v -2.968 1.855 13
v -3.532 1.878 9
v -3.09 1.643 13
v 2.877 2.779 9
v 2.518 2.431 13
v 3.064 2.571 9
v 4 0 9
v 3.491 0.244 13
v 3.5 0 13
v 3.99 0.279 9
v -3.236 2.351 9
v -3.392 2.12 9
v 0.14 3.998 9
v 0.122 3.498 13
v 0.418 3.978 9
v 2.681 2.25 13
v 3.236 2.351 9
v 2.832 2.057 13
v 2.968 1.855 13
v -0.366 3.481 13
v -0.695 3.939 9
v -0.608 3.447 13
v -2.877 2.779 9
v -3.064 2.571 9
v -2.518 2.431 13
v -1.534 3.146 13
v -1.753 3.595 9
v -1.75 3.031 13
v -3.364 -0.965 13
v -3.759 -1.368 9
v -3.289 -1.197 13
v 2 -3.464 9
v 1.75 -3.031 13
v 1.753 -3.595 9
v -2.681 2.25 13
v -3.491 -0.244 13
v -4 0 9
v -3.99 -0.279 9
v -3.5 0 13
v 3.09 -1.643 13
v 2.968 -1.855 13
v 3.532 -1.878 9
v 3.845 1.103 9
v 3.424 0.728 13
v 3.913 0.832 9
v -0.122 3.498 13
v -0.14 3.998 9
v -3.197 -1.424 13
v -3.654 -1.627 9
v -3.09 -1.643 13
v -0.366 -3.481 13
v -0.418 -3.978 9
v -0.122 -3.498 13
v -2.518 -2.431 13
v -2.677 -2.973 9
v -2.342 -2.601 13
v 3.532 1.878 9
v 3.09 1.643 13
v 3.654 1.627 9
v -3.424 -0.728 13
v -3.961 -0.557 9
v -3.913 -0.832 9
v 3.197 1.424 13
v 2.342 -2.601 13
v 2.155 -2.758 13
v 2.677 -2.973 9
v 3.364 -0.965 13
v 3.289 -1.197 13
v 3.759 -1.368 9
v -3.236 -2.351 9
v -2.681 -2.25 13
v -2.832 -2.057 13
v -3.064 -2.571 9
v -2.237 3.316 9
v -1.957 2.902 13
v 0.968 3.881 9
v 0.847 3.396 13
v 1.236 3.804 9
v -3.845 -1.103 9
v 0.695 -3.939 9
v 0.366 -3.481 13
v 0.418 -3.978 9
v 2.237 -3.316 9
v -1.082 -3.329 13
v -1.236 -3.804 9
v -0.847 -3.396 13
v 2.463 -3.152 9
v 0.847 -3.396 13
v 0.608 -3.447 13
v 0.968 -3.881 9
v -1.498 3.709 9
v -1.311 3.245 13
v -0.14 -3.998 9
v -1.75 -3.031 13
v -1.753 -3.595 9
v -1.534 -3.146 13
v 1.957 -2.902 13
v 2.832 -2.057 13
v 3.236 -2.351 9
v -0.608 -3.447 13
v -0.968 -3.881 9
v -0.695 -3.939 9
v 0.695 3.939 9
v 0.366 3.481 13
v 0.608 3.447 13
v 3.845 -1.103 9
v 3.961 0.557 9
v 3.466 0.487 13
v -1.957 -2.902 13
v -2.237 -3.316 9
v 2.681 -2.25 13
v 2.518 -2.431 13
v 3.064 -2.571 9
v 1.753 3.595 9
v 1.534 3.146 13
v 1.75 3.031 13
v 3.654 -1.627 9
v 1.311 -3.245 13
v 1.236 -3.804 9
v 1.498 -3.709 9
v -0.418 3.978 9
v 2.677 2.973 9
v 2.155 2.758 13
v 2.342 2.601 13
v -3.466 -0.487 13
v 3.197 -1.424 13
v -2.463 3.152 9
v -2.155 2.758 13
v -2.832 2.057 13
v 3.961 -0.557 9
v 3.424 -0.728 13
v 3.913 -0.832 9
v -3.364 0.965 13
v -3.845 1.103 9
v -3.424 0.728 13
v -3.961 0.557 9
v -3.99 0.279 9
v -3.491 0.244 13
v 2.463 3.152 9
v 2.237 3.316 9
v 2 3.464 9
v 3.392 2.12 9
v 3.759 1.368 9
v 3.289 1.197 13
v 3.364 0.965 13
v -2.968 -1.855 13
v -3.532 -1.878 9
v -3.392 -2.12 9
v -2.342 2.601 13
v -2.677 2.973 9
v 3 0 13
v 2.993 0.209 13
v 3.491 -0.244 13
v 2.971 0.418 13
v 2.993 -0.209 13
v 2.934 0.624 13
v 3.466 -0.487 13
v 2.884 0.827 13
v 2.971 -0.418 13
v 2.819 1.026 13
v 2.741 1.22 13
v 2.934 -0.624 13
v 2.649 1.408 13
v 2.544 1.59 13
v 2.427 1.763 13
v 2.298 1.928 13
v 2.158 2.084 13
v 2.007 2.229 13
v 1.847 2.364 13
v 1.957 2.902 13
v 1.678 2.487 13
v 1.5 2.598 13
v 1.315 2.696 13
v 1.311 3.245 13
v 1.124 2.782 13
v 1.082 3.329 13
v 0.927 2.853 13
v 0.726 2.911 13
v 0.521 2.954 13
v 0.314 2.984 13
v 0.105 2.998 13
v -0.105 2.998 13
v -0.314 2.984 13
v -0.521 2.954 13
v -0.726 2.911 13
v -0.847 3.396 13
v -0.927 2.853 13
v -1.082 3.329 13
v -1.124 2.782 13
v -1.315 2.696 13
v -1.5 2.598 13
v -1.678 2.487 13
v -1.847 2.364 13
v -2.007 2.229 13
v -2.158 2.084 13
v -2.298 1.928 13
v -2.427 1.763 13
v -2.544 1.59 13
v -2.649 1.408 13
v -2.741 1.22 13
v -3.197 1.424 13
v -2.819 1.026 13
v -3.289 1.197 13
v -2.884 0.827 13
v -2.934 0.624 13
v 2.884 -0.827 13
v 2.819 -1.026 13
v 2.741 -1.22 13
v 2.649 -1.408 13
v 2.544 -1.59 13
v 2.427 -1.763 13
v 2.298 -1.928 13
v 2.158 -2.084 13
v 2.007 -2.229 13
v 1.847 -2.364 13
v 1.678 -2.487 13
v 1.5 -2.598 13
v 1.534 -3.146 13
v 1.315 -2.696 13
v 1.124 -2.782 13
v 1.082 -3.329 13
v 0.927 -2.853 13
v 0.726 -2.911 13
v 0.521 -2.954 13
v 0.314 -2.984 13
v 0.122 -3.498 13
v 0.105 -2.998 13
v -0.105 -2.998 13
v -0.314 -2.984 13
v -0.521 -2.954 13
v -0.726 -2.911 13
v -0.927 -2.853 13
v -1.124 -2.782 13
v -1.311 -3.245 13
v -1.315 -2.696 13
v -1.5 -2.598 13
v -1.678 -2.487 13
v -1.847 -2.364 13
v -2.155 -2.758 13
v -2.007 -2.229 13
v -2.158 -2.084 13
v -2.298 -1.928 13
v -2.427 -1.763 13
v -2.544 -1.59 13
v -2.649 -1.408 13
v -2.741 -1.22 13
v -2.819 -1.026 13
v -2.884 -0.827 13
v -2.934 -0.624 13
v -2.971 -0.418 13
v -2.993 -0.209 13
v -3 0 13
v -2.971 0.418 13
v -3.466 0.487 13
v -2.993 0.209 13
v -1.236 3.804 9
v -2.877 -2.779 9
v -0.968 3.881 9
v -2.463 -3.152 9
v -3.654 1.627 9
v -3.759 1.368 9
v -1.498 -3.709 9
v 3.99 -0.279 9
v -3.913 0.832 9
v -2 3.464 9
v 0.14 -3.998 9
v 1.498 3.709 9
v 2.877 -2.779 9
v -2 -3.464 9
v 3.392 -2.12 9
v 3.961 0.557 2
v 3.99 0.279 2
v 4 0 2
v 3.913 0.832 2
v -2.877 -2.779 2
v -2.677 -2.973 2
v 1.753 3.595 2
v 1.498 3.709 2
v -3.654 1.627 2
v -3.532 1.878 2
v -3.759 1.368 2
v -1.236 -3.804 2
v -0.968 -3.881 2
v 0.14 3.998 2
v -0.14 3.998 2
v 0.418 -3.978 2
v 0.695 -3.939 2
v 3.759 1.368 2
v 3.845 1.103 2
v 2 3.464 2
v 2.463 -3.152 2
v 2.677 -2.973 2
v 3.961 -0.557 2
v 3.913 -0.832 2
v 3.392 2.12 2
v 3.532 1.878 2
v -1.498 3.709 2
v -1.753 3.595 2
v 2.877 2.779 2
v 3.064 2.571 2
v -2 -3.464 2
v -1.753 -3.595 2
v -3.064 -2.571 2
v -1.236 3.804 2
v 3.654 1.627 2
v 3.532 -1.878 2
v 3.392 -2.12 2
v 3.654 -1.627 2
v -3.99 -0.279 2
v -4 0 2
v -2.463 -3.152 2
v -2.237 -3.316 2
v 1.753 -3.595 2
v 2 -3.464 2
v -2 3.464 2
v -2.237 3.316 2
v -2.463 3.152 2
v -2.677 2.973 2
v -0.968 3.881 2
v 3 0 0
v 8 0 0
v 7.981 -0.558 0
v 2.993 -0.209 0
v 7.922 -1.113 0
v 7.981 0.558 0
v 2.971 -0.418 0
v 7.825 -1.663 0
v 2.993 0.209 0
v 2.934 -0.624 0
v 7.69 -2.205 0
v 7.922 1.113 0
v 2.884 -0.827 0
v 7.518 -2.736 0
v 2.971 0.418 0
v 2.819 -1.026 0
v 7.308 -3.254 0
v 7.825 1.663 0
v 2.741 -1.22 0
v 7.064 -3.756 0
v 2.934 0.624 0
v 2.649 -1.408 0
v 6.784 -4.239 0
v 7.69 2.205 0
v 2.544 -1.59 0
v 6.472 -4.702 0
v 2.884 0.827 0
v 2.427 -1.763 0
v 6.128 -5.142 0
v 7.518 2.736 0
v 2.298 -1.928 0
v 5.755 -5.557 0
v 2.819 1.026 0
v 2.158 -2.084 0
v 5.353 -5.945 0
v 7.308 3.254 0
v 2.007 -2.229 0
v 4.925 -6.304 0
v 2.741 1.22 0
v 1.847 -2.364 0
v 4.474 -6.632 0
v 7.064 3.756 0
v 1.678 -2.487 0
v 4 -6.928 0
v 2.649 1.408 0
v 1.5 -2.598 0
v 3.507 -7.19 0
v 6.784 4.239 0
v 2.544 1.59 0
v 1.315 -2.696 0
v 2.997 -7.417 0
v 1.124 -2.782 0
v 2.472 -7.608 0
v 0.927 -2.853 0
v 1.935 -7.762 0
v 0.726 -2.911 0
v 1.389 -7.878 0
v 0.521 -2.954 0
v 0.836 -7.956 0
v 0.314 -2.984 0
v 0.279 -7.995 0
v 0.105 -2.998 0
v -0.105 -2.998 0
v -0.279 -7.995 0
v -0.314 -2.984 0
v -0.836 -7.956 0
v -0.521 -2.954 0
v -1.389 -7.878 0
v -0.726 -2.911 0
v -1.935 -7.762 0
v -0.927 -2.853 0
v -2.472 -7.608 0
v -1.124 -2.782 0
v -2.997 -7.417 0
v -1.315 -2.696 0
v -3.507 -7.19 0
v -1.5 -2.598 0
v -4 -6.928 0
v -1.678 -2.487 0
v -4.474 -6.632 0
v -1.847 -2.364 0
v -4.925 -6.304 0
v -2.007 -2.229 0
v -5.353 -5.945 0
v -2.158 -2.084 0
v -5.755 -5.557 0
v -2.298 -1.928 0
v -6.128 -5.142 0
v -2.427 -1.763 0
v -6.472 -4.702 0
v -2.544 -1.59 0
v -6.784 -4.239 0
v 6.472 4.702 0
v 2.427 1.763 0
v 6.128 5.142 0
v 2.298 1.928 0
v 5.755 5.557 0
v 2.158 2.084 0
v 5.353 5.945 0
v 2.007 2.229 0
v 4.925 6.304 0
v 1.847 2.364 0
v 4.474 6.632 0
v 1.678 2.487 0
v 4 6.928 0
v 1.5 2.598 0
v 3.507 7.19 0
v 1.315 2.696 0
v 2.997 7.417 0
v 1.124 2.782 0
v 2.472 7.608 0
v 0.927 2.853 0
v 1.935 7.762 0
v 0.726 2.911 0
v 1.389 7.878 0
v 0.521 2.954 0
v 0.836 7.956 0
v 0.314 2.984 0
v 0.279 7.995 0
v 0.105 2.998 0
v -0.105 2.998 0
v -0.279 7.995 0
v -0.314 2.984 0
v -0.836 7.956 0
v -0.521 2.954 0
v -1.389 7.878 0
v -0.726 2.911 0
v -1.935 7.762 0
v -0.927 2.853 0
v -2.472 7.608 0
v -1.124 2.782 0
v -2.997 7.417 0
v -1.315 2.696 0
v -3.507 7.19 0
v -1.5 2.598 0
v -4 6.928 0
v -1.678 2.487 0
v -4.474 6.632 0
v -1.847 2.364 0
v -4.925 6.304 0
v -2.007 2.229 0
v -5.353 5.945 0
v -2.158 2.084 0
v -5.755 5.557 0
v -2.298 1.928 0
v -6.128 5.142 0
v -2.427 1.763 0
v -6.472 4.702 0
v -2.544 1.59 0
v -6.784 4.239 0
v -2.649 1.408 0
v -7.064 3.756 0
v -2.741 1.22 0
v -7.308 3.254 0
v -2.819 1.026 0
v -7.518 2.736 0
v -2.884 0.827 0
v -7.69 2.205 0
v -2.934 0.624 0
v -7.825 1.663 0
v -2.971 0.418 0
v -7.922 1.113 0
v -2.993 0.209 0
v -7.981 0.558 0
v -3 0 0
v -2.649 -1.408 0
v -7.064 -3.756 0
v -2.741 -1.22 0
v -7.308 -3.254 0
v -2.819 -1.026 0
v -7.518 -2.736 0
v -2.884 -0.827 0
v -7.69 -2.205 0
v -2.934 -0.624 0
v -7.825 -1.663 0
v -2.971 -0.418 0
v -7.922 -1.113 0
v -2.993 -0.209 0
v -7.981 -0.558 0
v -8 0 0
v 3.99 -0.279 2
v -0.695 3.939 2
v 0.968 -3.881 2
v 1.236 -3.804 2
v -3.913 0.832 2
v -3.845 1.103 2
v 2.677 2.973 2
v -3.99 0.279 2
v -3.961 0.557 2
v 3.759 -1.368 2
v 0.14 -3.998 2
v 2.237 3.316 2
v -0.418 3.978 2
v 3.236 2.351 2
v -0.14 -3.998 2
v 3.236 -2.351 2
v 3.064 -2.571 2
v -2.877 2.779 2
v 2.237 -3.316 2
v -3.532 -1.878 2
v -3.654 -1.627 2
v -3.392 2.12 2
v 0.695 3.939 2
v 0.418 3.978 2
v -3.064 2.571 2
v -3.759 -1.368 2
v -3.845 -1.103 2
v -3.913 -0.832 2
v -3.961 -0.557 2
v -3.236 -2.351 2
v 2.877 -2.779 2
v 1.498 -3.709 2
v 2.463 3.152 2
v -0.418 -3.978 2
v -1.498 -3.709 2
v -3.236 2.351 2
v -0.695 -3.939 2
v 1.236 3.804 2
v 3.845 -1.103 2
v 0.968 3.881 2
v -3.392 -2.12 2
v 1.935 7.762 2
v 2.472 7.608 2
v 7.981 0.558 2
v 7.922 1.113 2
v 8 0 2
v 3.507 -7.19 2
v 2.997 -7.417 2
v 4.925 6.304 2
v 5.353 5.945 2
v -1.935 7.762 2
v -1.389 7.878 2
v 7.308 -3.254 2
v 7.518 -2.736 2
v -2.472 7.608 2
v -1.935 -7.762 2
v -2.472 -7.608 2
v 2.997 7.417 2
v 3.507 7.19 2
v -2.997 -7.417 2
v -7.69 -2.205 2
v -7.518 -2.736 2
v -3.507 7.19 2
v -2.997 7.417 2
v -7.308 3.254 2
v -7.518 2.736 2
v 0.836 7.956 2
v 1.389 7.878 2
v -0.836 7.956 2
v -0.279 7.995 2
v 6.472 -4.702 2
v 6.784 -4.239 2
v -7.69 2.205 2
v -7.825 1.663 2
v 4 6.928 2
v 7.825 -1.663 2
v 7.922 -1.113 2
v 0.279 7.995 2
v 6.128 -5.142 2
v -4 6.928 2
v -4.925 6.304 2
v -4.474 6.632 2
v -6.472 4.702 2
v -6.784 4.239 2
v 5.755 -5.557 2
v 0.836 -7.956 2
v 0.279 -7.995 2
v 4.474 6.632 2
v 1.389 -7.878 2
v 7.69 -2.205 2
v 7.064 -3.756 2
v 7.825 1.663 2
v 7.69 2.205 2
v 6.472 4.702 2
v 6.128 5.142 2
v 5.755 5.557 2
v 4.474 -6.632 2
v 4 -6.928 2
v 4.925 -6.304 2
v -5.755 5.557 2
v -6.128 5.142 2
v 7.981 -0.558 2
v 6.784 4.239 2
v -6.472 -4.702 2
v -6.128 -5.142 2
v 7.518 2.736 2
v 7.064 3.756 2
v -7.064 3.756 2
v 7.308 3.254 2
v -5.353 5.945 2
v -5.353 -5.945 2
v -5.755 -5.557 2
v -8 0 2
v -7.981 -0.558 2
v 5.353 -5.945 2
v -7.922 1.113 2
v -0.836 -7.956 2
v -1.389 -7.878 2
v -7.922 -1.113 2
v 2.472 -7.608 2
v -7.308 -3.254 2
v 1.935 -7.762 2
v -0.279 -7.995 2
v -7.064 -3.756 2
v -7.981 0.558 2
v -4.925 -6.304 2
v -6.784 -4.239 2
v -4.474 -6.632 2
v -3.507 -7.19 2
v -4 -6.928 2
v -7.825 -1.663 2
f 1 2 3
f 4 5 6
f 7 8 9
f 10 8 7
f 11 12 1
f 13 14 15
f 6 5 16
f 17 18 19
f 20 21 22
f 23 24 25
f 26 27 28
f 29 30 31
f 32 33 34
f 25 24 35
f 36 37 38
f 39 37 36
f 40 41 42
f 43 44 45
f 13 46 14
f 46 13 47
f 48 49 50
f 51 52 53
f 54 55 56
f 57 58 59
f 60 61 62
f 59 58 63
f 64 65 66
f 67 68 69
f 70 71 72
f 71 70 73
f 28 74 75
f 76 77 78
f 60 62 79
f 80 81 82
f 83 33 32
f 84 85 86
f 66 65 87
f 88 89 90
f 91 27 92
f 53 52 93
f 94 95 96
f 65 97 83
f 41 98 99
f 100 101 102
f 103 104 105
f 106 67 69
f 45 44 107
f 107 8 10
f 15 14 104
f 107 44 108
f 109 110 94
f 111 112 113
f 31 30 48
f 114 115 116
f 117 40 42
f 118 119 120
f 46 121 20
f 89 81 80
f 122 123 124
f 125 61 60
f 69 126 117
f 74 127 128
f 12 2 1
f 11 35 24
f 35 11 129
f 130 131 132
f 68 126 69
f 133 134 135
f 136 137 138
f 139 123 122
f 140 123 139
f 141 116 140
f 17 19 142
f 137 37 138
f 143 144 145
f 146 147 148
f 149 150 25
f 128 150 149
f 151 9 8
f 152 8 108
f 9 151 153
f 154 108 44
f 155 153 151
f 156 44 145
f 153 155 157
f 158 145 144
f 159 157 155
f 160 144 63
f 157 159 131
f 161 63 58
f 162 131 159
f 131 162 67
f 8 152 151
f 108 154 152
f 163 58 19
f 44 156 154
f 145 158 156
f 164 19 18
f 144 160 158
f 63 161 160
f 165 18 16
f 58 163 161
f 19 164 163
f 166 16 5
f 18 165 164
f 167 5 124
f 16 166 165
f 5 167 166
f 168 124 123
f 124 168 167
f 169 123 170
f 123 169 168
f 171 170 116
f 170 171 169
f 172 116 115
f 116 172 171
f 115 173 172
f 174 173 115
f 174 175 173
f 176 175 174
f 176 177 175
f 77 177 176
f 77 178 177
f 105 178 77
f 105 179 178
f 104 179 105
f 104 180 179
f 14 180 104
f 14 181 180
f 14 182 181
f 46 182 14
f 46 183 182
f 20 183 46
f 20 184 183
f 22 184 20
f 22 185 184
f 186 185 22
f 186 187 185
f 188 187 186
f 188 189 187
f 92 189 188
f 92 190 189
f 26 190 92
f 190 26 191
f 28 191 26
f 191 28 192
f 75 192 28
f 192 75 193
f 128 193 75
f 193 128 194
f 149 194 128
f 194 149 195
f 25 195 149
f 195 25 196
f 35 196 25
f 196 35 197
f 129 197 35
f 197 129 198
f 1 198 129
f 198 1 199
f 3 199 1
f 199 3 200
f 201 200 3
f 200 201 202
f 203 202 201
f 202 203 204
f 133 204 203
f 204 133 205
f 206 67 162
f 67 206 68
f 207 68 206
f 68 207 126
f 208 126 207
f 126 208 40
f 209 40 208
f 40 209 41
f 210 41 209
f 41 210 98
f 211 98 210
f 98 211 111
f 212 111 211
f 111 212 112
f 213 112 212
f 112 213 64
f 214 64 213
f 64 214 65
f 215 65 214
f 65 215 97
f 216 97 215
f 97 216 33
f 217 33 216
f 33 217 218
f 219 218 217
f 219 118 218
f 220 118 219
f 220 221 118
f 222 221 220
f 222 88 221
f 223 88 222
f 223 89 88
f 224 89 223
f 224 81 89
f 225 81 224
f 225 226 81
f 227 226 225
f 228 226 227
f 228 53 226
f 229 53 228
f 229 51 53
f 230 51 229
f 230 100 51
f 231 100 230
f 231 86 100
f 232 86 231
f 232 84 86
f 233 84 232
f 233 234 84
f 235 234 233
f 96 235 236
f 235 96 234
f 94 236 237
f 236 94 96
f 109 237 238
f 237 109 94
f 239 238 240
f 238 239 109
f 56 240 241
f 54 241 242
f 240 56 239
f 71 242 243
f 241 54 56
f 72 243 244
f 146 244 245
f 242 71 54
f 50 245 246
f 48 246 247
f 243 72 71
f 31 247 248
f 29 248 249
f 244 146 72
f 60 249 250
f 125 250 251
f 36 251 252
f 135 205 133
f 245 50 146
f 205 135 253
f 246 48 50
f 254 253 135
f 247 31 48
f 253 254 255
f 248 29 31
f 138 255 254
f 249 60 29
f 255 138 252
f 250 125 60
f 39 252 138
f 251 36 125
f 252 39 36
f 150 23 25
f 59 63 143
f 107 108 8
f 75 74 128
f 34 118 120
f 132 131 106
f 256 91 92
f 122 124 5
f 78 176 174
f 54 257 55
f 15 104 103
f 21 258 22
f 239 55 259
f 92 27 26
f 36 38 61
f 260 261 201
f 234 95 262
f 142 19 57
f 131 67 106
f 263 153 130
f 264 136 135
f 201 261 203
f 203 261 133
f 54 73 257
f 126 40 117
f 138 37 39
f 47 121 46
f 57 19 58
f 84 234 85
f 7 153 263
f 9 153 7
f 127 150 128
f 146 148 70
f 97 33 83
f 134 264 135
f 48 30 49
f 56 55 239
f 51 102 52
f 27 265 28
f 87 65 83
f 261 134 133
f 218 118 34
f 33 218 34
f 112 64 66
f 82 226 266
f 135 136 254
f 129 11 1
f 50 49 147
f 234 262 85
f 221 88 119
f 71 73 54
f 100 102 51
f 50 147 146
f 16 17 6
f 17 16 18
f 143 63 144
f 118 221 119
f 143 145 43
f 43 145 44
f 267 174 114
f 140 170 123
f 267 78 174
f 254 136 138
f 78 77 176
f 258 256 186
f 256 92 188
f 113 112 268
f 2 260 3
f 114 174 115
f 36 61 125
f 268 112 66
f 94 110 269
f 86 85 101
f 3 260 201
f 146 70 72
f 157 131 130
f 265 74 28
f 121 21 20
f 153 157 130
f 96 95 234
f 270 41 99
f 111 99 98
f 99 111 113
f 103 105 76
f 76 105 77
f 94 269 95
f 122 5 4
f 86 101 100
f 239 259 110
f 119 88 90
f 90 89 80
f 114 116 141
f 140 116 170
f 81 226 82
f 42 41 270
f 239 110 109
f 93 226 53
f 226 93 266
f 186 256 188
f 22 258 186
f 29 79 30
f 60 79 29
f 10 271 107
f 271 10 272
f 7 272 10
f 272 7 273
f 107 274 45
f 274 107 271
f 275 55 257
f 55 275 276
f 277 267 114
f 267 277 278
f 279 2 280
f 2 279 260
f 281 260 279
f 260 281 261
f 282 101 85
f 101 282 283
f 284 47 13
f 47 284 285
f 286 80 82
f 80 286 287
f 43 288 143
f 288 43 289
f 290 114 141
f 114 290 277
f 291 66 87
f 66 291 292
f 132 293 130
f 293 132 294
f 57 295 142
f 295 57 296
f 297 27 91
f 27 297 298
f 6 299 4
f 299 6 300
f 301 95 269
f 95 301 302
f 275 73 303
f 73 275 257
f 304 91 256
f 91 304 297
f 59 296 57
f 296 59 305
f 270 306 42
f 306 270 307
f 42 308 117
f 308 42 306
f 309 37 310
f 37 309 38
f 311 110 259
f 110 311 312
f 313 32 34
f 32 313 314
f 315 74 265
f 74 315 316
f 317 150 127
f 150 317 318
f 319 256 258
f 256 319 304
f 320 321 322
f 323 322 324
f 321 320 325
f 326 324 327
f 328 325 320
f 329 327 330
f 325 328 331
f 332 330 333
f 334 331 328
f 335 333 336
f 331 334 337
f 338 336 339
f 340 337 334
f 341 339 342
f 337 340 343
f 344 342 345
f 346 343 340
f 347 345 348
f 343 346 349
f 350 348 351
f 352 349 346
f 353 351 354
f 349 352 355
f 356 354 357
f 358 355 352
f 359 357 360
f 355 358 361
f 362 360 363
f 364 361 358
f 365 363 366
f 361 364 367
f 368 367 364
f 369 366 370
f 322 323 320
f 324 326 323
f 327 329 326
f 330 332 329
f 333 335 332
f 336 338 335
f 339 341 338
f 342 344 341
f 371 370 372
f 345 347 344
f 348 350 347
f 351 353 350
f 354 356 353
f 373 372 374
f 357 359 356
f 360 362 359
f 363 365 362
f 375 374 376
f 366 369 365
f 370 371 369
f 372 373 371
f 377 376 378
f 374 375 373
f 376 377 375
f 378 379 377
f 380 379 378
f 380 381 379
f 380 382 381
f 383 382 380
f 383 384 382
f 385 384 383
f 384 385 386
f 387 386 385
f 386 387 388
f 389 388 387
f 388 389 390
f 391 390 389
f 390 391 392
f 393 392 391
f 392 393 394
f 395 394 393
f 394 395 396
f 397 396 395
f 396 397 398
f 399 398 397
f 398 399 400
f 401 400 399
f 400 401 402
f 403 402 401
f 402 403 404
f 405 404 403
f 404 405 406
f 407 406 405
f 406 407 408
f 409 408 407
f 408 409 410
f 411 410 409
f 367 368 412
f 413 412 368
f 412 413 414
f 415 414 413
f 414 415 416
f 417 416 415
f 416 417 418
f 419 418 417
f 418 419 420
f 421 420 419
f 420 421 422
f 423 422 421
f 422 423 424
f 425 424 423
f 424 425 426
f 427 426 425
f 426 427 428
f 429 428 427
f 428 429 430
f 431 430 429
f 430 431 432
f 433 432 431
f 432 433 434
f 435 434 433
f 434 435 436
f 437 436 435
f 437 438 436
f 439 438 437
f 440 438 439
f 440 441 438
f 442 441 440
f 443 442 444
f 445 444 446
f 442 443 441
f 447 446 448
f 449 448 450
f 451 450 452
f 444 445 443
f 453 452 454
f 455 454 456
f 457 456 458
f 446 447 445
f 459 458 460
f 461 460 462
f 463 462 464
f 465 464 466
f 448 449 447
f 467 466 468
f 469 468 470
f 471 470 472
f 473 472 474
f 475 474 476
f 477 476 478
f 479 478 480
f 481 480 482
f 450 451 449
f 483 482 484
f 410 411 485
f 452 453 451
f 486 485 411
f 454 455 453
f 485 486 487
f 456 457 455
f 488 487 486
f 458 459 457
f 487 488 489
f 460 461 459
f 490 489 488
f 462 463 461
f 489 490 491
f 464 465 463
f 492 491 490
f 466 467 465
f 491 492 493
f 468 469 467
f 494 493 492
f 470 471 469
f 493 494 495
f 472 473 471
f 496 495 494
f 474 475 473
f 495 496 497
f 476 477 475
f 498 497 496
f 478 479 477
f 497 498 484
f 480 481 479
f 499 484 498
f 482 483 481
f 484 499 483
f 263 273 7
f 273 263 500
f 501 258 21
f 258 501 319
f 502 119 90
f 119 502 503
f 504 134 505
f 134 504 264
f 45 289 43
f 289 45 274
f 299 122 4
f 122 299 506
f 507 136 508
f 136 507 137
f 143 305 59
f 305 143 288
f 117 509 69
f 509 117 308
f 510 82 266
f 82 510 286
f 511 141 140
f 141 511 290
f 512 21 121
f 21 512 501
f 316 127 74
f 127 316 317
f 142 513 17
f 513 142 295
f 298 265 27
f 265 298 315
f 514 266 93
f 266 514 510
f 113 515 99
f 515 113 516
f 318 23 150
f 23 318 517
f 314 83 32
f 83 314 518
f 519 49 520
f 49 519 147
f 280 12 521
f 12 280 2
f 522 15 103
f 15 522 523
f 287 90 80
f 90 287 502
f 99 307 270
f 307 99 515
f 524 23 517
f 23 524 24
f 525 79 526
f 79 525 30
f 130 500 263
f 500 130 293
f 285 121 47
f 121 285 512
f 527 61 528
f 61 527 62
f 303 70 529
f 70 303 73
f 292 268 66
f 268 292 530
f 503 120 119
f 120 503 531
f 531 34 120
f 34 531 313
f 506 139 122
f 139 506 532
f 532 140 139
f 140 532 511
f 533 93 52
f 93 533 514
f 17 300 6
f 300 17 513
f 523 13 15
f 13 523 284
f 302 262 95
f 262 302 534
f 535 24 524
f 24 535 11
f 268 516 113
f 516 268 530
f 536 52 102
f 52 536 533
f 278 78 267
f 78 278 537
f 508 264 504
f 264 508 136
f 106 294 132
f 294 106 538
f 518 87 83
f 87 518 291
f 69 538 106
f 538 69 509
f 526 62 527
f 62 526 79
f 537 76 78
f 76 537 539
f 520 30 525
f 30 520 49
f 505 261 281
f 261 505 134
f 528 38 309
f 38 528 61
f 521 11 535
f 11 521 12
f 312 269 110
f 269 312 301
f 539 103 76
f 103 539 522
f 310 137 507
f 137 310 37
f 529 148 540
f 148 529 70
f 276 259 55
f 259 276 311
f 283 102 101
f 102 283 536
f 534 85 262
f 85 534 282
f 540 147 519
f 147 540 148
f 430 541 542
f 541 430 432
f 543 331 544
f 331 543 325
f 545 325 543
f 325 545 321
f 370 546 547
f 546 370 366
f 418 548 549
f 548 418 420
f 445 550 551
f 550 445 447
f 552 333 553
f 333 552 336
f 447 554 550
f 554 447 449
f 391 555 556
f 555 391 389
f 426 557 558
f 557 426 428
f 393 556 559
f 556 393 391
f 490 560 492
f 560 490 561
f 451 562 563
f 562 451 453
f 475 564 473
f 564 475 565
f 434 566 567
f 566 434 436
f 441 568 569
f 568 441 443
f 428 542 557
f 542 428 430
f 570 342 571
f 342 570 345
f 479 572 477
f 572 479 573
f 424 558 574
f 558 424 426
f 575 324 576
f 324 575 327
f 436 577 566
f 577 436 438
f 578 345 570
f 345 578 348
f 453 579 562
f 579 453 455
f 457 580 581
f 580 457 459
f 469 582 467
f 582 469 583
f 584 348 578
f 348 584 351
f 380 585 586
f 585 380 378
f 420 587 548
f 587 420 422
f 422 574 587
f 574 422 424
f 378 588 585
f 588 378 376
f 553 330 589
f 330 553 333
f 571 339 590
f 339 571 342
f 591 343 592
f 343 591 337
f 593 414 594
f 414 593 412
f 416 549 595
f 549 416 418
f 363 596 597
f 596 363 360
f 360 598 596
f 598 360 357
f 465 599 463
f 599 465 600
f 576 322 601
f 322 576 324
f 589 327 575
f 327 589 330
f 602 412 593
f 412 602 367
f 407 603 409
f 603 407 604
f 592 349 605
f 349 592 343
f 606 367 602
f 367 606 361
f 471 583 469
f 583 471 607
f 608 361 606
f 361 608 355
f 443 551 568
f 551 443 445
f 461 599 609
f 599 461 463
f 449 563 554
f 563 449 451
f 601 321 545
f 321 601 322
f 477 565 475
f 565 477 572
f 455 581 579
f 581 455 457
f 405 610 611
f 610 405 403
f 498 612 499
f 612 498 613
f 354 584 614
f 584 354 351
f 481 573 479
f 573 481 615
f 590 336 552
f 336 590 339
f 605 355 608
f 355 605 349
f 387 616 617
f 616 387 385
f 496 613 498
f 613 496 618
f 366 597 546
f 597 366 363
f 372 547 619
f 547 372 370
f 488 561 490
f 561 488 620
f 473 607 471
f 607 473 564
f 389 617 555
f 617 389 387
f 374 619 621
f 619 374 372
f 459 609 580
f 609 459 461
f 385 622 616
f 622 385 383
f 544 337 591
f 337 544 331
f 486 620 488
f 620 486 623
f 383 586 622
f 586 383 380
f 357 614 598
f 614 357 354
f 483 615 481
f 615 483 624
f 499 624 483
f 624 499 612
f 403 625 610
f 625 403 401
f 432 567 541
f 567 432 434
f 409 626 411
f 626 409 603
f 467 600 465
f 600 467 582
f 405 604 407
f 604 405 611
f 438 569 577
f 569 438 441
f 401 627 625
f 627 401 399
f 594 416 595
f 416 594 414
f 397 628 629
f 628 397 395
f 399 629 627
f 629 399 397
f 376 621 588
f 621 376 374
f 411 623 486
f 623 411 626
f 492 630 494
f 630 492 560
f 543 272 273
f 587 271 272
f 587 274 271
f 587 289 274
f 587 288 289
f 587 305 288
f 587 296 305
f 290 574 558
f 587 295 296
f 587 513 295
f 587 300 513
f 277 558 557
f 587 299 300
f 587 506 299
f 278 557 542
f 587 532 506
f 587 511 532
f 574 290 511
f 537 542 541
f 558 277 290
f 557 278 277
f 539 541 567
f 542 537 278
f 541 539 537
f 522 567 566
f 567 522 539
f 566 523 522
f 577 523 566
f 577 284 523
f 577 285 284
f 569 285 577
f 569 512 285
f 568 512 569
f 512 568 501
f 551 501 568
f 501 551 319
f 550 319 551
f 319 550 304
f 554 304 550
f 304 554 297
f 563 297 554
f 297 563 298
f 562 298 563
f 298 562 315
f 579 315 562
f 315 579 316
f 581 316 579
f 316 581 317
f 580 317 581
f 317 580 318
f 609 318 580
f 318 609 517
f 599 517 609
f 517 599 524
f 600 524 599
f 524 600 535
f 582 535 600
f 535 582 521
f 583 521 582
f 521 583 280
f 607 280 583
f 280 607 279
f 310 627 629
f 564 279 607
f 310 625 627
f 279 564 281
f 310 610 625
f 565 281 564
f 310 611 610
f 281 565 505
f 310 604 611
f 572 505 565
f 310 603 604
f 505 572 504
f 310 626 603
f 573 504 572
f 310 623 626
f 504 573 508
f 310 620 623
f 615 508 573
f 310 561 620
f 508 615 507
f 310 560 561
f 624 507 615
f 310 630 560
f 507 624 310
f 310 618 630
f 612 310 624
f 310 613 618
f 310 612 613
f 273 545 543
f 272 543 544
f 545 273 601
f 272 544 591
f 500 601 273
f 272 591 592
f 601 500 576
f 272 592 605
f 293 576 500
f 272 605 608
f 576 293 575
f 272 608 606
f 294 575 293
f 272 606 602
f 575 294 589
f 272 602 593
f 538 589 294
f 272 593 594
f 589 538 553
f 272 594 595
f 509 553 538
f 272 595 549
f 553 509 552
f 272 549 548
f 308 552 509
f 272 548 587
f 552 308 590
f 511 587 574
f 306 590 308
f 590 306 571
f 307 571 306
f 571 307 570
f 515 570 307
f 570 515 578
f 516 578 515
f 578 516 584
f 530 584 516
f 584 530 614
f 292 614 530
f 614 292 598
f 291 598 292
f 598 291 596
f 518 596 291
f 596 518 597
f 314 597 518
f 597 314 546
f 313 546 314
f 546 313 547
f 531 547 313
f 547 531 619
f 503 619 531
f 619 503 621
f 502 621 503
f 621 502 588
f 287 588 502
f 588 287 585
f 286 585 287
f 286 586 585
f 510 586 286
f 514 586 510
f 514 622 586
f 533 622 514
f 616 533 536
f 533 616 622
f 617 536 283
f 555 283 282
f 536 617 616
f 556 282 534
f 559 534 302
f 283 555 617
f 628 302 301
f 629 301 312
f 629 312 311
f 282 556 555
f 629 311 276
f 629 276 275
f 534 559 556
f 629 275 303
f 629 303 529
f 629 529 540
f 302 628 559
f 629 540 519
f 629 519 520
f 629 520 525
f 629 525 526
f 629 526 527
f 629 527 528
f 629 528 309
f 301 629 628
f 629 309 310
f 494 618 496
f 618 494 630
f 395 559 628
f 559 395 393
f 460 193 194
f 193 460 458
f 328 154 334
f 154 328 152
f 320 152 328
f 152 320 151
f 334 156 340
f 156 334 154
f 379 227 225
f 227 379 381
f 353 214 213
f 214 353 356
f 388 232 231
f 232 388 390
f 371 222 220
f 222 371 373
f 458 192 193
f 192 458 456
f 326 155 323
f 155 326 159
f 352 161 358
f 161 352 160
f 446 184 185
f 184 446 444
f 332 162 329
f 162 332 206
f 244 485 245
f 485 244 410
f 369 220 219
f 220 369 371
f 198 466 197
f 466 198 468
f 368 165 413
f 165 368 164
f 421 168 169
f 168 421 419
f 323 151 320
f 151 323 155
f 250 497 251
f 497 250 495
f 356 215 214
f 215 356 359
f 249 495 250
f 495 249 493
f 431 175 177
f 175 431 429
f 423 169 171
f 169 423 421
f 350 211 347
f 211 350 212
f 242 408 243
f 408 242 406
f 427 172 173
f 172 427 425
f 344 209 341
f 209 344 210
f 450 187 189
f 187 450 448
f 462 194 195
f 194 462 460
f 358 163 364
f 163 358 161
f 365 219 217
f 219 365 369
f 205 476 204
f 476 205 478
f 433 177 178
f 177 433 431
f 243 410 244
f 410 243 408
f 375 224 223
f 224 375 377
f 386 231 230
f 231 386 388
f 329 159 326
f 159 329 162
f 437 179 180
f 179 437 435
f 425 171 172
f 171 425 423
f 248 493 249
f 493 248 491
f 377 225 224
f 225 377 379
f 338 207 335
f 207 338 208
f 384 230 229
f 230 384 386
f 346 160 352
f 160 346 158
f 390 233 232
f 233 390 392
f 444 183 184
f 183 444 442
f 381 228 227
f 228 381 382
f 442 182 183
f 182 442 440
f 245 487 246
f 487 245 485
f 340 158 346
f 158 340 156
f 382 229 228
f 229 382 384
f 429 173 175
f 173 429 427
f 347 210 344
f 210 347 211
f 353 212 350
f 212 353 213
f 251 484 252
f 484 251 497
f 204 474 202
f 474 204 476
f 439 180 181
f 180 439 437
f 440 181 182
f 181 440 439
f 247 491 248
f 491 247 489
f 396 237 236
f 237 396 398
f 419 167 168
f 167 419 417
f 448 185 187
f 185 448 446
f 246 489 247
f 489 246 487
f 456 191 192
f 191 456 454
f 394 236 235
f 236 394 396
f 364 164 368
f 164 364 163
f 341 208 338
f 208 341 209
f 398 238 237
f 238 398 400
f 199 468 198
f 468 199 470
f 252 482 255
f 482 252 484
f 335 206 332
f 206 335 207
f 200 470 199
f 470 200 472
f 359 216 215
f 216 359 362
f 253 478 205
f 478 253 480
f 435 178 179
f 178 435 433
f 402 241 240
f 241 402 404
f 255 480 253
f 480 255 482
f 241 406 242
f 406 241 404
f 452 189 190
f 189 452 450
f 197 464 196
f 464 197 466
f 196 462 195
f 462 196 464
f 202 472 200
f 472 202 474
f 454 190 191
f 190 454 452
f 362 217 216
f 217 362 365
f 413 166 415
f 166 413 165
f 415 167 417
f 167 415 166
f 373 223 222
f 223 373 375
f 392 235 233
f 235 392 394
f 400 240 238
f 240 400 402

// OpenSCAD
$fn = 90;

difference() {
    translate([0, 0, 0]) {
        translate([0, 0, 9]) cylinder(d1 = 8, d2 = 7, h = 4);
        cylinder(d = 8, h = 9);
        cylinder(d = 16, h = 2);
    }
    translate([0, 0, -1]) cylinder(d = 6, h = 20);
}
